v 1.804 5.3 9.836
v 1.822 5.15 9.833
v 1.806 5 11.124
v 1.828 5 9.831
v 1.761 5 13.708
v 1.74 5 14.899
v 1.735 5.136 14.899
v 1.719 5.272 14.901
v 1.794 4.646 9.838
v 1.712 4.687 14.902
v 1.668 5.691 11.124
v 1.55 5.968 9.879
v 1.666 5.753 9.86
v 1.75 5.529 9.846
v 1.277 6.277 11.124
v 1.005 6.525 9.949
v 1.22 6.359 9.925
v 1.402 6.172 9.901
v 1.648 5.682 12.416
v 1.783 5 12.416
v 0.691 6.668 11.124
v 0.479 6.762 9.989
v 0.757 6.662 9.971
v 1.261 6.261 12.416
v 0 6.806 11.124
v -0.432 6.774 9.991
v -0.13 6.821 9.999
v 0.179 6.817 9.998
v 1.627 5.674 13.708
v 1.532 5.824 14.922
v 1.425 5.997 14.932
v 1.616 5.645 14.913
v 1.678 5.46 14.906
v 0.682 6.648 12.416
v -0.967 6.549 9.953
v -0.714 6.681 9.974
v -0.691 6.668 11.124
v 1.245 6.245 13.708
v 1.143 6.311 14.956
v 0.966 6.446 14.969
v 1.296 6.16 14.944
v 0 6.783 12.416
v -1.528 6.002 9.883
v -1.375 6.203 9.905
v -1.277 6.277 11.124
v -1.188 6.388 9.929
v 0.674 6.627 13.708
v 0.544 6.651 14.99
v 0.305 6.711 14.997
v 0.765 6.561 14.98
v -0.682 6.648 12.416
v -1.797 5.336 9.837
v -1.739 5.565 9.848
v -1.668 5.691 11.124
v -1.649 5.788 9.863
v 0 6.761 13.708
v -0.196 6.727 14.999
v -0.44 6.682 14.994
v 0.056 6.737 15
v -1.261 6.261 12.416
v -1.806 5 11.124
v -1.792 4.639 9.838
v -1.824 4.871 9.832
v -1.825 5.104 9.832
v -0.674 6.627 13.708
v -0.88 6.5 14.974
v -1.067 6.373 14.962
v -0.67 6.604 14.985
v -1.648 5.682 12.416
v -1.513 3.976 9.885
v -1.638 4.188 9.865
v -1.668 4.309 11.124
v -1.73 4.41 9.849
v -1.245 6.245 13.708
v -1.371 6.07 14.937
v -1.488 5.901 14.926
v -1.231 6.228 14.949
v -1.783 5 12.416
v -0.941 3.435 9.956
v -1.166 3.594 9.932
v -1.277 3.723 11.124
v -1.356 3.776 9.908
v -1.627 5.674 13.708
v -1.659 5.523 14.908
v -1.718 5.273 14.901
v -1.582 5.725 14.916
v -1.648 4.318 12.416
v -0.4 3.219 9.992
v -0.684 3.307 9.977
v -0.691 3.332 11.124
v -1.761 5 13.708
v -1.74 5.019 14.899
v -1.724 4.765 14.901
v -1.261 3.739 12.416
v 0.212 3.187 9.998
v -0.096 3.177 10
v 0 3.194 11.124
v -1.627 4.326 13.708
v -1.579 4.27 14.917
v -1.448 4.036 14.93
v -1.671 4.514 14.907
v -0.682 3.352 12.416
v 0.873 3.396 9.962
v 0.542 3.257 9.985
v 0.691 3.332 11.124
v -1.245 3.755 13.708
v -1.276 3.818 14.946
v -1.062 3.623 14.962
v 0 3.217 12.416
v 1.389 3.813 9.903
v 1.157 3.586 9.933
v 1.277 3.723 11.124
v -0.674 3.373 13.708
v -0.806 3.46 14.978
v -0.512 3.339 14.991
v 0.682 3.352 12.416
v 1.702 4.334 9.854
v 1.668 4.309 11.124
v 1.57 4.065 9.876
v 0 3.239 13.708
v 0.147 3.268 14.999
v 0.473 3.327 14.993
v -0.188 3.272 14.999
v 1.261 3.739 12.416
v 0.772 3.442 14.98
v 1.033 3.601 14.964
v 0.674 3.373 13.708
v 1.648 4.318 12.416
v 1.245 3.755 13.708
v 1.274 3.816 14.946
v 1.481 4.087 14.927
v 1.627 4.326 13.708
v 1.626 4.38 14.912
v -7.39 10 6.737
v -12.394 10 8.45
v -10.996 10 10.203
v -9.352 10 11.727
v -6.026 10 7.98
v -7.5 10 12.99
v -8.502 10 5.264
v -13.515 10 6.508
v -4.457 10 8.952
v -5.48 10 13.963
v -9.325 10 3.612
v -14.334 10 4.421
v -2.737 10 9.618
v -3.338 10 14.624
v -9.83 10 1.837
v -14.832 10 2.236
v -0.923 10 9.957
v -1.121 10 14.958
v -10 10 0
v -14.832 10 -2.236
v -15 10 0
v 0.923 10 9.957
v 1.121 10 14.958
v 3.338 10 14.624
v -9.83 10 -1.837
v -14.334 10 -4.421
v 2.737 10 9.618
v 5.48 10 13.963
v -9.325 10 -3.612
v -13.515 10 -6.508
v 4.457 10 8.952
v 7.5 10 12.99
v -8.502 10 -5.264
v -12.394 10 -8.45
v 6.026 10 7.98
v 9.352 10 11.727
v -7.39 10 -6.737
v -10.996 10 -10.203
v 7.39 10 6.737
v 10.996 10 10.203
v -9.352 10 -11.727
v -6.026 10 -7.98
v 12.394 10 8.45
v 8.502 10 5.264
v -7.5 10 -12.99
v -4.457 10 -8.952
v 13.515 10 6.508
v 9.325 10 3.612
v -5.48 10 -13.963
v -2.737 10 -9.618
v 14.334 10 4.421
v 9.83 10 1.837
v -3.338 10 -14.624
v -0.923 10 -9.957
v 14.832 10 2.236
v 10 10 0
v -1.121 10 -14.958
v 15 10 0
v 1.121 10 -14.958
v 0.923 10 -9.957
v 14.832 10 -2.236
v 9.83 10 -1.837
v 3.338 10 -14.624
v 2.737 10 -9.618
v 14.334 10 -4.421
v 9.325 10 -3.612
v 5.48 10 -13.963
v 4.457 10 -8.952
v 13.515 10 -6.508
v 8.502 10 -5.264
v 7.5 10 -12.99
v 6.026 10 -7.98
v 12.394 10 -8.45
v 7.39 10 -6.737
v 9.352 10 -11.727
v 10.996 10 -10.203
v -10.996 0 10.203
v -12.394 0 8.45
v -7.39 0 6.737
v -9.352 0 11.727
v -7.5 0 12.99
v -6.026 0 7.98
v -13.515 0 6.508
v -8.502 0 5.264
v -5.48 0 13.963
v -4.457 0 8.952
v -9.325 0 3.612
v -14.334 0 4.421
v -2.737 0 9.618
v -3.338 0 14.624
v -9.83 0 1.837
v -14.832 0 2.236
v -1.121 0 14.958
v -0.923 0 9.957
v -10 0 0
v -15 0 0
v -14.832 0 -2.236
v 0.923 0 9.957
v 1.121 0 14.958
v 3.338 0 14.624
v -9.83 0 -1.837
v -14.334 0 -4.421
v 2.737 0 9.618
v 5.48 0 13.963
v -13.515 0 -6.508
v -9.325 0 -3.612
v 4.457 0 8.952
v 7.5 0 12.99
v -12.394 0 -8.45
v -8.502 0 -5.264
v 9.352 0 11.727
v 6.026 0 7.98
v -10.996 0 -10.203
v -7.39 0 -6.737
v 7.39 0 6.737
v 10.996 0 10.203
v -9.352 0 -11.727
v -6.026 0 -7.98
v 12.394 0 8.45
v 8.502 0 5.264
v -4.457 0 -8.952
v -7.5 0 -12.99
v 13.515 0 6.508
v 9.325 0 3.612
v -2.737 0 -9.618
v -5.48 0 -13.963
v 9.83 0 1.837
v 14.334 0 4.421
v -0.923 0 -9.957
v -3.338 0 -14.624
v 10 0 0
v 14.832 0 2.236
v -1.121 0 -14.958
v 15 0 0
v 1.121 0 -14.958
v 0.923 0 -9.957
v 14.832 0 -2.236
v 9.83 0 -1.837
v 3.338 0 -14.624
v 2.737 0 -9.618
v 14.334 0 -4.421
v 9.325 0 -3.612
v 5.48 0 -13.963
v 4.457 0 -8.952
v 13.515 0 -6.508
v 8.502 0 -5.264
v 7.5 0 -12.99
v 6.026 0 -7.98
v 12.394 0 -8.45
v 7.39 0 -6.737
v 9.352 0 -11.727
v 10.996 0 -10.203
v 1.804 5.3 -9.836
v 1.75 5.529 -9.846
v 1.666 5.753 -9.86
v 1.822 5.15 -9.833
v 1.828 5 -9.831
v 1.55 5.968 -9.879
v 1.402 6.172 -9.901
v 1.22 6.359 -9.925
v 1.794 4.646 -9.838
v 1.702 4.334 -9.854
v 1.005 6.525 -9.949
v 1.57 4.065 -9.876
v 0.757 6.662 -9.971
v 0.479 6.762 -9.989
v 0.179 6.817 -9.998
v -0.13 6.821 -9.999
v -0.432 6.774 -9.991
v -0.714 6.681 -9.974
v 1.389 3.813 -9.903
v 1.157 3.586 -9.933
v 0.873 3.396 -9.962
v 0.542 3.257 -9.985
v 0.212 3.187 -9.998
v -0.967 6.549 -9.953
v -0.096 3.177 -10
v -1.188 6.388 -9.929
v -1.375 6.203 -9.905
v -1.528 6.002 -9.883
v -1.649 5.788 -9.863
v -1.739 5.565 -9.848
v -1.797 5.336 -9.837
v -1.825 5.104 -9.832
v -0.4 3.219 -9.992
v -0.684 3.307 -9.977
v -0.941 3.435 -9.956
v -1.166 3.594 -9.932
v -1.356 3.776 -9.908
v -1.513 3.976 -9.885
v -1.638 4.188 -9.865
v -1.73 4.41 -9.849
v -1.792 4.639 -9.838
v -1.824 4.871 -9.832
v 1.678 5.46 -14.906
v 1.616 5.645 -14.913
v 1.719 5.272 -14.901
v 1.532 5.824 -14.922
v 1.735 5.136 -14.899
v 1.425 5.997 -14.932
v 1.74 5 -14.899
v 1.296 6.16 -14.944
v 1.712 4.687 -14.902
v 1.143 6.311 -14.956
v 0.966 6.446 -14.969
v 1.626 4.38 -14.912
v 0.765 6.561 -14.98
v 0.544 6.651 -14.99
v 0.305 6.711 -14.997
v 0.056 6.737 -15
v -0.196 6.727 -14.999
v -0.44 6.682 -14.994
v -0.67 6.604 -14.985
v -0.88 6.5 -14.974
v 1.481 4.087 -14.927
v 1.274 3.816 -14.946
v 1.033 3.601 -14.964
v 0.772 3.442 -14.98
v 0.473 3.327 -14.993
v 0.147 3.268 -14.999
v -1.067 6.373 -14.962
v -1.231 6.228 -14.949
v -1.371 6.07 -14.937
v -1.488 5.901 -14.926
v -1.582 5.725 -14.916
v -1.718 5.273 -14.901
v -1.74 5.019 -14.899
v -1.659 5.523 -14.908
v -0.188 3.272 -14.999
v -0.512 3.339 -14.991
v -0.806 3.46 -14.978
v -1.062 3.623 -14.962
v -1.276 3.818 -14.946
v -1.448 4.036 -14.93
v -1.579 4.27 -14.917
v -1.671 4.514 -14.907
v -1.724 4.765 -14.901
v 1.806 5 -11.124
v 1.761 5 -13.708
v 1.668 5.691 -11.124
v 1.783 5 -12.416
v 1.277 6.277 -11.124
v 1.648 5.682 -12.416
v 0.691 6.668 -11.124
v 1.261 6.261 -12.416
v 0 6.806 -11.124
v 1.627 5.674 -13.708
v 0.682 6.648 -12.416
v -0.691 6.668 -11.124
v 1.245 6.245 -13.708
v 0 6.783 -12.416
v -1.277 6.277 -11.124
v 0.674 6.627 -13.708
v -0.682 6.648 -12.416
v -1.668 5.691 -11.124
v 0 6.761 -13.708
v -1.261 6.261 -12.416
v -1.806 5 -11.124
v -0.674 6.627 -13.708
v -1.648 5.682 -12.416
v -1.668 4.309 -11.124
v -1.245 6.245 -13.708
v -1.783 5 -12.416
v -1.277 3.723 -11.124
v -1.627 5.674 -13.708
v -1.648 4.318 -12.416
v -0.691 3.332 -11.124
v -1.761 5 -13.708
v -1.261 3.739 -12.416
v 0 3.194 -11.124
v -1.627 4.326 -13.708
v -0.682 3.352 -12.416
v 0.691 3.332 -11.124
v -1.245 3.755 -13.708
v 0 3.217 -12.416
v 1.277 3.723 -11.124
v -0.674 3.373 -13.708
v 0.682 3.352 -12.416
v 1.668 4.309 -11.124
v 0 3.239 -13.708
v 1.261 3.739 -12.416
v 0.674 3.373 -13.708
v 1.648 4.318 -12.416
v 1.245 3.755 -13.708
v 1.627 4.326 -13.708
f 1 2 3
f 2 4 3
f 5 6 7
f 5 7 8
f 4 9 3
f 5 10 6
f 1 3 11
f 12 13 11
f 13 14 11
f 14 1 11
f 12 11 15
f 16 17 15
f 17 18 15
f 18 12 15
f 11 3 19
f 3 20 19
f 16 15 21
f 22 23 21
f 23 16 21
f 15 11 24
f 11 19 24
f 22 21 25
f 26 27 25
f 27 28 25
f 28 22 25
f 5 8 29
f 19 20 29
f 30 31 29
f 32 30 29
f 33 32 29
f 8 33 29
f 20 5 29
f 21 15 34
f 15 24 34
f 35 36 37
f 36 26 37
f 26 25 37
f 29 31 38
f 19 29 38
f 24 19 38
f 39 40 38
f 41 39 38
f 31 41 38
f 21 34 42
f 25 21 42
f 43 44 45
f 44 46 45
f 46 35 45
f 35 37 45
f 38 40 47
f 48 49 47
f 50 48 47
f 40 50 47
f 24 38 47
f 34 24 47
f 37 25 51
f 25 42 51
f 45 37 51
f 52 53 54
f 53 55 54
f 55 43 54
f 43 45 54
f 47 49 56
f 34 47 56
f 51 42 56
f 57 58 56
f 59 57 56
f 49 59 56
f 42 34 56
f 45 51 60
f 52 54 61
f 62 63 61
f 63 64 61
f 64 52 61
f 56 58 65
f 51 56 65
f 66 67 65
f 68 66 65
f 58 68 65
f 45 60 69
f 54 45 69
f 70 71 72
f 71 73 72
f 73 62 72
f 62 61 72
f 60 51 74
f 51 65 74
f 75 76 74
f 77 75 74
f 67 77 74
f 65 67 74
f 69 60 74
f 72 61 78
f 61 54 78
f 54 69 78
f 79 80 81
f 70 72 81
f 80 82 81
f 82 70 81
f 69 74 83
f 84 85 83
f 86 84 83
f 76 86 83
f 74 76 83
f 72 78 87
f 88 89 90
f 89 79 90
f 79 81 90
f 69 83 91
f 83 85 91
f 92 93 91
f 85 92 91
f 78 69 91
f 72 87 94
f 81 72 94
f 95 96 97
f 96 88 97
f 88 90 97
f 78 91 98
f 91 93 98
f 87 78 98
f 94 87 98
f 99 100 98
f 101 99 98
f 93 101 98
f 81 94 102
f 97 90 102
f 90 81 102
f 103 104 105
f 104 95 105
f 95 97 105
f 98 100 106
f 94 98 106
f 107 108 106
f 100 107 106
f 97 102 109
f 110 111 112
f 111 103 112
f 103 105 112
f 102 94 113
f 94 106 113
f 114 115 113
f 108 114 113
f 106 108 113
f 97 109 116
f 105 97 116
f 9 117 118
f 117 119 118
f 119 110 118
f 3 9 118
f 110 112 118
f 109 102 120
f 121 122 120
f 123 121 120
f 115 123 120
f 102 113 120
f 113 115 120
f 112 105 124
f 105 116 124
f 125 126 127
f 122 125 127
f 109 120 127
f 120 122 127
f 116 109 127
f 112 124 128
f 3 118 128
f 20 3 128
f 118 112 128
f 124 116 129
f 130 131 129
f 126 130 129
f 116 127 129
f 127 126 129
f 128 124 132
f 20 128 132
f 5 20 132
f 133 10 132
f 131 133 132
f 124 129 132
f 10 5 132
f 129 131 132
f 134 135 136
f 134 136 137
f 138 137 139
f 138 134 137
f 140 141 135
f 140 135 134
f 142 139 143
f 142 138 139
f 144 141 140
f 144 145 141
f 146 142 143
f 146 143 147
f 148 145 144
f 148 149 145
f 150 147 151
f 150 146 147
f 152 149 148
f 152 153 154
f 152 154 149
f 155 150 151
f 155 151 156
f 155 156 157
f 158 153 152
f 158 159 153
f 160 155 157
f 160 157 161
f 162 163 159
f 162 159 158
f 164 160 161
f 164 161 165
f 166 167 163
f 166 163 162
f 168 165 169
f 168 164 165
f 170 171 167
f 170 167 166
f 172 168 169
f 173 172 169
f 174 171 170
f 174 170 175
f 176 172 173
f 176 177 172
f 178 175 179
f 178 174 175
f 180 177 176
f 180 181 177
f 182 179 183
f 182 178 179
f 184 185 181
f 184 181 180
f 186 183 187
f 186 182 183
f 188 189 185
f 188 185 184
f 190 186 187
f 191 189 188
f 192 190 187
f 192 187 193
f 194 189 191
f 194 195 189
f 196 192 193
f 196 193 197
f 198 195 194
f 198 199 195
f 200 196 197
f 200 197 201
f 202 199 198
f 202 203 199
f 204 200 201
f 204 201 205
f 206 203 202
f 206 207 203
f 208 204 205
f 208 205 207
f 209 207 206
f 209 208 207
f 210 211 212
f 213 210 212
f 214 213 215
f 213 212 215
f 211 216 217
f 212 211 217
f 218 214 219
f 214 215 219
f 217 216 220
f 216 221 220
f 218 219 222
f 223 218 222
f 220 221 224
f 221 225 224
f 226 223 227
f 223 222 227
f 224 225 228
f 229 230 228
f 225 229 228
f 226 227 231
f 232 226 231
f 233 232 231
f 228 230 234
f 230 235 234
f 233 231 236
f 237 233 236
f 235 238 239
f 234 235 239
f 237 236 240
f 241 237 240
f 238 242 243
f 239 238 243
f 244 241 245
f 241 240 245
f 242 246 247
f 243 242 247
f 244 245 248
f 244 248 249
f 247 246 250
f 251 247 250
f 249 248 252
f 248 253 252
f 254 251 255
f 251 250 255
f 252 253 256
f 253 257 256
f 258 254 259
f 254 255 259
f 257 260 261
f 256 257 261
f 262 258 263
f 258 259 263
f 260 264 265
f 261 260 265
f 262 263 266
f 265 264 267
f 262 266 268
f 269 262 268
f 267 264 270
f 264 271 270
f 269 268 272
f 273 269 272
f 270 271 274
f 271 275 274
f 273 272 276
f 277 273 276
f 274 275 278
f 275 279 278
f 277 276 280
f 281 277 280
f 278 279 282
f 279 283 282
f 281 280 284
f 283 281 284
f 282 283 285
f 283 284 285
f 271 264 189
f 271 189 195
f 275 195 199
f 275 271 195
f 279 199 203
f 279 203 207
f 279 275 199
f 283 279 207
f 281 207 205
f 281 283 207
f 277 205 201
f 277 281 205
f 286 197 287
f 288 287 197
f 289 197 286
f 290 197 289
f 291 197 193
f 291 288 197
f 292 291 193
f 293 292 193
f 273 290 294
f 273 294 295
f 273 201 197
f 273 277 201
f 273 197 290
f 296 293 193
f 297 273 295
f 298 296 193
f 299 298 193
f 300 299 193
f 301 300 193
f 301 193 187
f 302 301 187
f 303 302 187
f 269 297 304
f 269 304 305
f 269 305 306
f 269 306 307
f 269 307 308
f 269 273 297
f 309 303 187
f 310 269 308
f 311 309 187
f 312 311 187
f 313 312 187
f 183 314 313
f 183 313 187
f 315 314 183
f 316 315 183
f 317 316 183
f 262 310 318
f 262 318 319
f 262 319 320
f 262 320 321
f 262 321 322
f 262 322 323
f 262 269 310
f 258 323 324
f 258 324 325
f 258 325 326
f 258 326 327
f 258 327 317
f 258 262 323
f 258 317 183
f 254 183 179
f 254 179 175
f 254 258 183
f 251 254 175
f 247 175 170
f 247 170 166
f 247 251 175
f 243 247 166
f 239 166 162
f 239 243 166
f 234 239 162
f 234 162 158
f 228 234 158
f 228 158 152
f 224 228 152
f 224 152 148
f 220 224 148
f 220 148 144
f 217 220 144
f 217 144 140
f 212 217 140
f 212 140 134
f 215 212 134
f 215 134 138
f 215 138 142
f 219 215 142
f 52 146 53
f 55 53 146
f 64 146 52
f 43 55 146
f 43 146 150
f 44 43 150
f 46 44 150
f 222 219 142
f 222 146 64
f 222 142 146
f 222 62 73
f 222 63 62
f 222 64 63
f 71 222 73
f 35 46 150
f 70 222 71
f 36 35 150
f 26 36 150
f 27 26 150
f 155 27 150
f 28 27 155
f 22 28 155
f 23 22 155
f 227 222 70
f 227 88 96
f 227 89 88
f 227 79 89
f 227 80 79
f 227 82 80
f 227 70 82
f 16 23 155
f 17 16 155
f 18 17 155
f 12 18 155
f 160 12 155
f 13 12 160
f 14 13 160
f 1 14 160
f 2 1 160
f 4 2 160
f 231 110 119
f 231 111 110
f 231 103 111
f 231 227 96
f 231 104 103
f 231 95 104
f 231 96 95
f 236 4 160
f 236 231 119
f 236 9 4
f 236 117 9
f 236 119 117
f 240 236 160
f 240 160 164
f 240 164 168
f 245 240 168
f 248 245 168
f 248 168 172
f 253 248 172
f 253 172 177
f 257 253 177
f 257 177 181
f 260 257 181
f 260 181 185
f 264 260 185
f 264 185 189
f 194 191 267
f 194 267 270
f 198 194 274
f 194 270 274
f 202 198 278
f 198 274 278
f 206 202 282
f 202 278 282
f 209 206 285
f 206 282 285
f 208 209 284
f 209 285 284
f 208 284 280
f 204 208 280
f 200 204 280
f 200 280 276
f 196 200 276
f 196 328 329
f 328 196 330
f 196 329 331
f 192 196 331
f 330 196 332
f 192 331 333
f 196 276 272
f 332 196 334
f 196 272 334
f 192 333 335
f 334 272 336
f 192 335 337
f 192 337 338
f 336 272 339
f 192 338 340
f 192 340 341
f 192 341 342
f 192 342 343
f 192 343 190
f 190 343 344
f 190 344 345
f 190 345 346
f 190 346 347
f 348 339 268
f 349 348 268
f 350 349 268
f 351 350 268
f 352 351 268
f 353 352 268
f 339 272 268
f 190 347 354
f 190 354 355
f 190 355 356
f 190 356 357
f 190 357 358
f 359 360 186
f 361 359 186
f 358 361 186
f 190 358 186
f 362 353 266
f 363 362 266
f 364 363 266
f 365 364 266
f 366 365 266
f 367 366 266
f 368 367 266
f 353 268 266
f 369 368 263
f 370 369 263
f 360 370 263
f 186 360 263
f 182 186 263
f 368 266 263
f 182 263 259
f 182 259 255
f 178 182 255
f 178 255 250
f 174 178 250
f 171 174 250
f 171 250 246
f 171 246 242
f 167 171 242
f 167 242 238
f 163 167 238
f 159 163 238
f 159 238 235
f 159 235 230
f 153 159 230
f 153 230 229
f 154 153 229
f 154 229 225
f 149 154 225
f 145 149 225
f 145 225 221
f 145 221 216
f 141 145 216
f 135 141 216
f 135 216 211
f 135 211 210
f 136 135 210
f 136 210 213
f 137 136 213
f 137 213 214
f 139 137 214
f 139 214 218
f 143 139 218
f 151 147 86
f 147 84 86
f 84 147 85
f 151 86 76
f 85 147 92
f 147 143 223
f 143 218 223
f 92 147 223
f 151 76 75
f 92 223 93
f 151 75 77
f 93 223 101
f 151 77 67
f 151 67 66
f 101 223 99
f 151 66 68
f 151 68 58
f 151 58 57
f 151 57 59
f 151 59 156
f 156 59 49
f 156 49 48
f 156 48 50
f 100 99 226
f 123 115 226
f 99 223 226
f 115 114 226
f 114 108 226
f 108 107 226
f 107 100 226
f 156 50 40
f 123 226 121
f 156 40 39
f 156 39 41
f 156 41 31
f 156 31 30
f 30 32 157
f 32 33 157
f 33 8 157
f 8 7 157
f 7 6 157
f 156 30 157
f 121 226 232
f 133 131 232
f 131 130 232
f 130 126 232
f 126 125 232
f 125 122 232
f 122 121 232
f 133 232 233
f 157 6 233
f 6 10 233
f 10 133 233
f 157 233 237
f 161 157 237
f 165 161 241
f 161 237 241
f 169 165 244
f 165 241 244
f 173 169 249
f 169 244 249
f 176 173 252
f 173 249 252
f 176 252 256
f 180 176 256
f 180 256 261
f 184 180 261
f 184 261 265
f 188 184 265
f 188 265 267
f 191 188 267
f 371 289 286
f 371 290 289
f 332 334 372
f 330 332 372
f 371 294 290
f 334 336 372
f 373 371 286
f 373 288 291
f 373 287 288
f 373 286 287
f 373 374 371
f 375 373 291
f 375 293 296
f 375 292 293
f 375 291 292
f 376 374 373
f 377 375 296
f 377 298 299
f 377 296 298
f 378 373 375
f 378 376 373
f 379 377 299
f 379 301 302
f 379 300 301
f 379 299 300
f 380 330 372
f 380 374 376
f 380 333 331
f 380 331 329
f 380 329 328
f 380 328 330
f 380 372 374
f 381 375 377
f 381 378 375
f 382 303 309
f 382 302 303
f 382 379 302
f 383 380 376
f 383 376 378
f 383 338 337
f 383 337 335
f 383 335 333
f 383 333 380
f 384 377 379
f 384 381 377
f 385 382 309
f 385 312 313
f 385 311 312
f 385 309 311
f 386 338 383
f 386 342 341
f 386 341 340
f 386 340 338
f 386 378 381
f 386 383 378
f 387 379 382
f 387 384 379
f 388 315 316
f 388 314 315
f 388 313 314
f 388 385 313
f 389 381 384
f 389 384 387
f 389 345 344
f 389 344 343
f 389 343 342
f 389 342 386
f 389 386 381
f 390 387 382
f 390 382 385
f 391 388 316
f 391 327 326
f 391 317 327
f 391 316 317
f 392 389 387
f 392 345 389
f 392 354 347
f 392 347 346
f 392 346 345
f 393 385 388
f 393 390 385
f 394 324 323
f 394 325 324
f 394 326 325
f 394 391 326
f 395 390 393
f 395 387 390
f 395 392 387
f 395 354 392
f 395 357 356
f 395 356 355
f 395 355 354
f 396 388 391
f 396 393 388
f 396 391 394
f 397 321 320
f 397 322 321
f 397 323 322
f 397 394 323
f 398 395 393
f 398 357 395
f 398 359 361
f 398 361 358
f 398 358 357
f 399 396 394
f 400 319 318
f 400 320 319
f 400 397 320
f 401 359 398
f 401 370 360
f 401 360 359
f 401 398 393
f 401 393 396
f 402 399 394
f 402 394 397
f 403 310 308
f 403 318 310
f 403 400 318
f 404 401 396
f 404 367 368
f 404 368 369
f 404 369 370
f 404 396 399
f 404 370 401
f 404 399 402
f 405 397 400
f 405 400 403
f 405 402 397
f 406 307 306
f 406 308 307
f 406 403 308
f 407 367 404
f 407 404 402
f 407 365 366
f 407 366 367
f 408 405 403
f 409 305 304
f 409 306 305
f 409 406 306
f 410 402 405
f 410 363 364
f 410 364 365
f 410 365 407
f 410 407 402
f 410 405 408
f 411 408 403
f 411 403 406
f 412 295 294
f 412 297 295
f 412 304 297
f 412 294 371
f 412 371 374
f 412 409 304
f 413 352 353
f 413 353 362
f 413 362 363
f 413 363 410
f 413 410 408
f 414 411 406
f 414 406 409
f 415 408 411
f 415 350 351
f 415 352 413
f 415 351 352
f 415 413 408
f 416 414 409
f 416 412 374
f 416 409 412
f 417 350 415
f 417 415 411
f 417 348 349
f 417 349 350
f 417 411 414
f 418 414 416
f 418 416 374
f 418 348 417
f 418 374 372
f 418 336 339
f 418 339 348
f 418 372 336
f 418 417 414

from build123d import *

# Parameters (mm, degrees)
SKETCH3_R                    = 15
SKETCH3_R_2                  = 10
BOSS_EXTRUDE1_DEPTH          = 10
SKETCH4_R                    = 2
CUT_EXTRUDE1_DEPTH           = 21
CUT_EXTRUDE1_TAPER           = 1
CUT_EXTRUDE1_OTHER_WAY_DEPTH = 19
CUT_EXTRUDE1_OTHER_WAY_TAPER = 1


with BuildPart() as part:
    # Sketch3 → Boss-Extrude1 (new body)
    with BuildSketch(Plane(origin=(0, 0, 0), x_dir=(1, 0, 0), z_dir=(0, 1, 0))):
        Circle(SKETCH3_R)
        Circle(SKETCH3_R_2, mode=Mode.SUBTRACT)
    extrude(amount=BOSS_EXTRUDE1_DEPTH)

    # Sketch4 → Cut-Extrude1 (cut)
    with BuildSketch(Plane.XY):
        with Locations((0, 5)):
            Circle(SKETCH4_R)
    extrude(amount=-CUT_EXTRUDE1_DEPTH, taper=CUT_EXTRUDE1_TAPER, mode=Mode.SUBTRACT)

    # Sketch4 → Cut-Extrude1 other way (cut)
    with BuildSketch(Plane.XY):
        with Locations((0, 5)):
            Circle(SKETCH4_R)
    extrude(amount=CUT_EXTRUDE1_OTHER_WAY_DEPTH, taper=CUT_EXTRUDE1_OTHER_WAY_TAPER, mode=Mode.SUBTRACT)


solid = part.part
